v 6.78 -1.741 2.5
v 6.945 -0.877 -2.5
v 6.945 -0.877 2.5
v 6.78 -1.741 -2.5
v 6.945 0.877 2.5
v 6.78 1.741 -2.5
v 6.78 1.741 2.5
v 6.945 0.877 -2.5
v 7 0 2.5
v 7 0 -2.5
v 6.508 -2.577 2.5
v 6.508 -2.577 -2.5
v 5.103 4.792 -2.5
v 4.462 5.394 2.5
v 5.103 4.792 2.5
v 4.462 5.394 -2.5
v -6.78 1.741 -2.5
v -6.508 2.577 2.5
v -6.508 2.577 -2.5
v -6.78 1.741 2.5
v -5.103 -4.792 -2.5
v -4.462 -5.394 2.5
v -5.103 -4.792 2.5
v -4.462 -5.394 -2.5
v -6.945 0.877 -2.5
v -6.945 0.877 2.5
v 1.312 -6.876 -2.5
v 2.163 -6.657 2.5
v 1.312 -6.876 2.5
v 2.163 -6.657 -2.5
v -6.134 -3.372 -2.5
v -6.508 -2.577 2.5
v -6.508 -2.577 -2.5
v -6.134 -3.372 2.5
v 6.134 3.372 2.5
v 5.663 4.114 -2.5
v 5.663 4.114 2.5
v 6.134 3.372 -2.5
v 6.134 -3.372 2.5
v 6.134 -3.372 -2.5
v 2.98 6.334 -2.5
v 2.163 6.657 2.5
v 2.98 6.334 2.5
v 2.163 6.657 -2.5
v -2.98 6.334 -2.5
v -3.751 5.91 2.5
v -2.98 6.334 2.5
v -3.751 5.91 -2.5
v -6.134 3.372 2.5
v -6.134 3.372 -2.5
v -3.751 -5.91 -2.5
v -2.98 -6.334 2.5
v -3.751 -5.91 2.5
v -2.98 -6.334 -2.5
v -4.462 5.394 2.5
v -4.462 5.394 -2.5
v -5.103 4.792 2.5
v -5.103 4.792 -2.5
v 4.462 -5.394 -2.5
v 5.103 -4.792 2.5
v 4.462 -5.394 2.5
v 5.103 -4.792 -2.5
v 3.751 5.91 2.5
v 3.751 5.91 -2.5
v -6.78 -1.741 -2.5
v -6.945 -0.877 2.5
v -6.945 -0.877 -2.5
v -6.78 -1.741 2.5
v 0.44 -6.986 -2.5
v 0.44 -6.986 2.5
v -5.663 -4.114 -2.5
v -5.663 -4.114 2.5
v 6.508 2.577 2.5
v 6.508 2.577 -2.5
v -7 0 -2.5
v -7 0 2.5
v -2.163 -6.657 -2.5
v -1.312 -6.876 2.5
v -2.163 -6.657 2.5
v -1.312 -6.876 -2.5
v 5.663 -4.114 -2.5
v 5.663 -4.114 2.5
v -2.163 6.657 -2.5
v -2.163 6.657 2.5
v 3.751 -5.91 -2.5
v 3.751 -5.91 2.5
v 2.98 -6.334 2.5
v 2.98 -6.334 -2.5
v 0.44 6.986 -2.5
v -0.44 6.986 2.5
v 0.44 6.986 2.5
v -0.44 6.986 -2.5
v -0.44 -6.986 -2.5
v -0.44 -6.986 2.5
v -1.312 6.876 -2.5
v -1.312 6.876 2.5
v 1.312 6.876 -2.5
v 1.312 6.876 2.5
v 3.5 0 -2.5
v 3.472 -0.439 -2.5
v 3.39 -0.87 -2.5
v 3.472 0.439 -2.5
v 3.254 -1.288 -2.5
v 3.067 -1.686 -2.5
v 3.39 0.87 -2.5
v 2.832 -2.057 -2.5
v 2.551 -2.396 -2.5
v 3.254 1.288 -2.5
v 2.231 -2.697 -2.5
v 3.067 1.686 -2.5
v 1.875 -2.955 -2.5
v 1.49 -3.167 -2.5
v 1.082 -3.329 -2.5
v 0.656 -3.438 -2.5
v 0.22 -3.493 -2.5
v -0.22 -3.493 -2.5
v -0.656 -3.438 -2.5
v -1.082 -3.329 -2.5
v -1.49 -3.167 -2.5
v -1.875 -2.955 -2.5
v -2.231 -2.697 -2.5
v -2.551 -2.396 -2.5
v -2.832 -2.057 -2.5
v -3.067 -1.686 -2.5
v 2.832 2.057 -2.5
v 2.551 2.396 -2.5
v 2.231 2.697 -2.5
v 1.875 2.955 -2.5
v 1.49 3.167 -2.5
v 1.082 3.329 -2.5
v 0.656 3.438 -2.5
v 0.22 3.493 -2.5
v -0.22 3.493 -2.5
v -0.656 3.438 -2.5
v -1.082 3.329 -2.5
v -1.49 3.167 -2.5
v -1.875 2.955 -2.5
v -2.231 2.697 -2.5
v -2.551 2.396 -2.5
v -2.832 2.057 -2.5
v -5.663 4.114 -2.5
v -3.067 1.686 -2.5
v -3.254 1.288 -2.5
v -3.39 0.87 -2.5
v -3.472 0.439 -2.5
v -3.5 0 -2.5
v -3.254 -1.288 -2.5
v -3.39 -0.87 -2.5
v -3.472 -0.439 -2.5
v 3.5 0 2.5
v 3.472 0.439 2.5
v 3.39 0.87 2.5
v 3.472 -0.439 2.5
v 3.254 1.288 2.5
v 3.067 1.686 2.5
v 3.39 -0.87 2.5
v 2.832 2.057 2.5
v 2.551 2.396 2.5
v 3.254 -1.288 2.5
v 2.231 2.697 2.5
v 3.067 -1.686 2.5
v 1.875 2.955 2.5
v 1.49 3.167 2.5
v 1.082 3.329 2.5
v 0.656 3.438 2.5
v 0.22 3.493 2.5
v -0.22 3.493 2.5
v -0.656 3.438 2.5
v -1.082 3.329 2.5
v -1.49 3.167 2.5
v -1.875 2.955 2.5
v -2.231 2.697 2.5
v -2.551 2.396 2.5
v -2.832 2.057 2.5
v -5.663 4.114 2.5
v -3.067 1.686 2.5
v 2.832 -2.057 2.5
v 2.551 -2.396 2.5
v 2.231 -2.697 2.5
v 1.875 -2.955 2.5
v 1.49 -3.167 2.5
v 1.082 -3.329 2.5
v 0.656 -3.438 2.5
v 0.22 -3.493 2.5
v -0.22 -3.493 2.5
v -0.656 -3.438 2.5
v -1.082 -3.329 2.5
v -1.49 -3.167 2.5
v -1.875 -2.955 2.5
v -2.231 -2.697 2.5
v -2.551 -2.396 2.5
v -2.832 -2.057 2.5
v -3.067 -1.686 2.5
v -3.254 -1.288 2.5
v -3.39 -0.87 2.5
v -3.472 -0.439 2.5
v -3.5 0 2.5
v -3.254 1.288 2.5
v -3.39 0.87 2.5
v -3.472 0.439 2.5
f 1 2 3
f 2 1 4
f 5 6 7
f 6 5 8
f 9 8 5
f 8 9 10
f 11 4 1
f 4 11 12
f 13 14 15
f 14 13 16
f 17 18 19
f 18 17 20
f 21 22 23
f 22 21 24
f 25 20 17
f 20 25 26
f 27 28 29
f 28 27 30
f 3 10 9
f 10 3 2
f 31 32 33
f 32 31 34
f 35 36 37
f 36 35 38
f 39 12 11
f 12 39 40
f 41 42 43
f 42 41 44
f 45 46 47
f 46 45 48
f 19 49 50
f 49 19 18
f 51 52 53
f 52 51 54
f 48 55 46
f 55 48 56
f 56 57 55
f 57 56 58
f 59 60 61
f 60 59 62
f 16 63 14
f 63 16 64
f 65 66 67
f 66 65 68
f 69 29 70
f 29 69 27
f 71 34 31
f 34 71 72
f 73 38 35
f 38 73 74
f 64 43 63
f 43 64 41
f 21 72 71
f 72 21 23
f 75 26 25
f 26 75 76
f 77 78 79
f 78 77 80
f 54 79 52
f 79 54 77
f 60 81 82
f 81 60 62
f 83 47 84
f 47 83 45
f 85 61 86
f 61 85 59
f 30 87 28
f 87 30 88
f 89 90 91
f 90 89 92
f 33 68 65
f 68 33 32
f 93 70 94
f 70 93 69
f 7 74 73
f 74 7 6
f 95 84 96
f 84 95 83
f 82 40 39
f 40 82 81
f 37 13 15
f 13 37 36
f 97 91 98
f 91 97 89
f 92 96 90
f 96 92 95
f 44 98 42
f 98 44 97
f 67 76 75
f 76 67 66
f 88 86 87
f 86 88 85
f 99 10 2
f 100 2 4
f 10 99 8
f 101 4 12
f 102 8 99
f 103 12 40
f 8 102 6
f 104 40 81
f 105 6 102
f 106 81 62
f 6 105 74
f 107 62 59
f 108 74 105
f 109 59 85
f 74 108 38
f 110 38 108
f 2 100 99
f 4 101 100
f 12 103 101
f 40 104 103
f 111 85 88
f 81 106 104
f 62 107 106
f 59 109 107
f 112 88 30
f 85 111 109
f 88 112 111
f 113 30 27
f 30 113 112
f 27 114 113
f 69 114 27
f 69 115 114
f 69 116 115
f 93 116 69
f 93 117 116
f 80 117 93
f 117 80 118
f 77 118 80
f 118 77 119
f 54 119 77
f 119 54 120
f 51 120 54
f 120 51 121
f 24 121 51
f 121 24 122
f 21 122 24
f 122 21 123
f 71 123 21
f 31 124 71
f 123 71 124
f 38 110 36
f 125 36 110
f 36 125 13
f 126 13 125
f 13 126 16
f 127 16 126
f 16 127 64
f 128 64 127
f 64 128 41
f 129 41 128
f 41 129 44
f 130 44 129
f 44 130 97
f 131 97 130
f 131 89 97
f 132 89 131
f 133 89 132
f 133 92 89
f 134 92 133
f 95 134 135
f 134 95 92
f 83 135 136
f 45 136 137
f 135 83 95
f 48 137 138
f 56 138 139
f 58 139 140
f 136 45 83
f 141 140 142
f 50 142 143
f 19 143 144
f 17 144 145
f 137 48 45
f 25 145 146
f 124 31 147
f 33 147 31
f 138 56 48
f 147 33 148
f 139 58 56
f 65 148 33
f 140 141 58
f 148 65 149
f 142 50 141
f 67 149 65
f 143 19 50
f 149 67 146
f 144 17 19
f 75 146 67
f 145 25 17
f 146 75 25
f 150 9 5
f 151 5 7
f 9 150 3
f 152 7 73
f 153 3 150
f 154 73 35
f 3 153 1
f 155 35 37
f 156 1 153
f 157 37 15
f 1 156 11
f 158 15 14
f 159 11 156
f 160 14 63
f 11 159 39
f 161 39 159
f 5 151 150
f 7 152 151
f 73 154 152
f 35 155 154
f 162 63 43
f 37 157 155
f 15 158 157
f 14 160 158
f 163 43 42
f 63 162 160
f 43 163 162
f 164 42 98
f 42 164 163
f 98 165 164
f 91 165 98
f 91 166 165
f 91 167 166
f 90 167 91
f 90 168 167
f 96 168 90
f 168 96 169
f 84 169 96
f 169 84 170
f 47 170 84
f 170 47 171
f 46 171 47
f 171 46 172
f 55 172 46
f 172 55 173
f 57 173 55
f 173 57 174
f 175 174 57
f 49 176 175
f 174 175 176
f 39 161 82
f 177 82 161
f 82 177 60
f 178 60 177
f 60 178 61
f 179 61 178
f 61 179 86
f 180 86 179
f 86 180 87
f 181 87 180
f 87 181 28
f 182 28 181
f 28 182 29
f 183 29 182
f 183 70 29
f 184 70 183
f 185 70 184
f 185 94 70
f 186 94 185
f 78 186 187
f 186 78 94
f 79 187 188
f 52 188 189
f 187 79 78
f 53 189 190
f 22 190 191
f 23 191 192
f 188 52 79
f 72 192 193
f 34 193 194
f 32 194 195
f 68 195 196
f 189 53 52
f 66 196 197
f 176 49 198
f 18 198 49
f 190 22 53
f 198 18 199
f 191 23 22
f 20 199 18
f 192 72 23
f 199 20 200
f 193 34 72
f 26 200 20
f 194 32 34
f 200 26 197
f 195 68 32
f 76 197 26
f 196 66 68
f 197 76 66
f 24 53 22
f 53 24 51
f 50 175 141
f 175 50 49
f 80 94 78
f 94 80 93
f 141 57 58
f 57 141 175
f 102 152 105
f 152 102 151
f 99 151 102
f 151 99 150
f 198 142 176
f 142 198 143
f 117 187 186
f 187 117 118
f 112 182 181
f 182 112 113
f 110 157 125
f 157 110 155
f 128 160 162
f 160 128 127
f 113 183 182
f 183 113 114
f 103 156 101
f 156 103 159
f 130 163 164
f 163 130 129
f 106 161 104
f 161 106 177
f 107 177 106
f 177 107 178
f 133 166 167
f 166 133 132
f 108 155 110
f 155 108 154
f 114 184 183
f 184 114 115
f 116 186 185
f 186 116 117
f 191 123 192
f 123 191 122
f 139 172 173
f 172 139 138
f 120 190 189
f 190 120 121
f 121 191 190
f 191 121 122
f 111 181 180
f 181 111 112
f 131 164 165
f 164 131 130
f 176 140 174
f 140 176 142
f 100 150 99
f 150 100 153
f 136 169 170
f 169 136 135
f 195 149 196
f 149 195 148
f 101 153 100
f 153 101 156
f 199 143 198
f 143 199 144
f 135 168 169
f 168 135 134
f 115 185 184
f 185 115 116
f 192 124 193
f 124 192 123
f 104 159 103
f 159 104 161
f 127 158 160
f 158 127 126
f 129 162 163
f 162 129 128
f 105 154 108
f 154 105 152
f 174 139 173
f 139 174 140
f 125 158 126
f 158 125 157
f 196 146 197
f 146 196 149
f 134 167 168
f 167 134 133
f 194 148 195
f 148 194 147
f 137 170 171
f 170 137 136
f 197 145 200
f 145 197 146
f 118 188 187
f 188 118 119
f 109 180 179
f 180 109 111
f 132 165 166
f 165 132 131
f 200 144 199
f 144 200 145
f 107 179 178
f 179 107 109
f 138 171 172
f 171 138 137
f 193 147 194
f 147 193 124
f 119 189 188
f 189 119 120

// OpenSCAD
$fn = 50;


difference() {
	union() {
		translate(v = [0, 0, -2.5000000000]) {
			cylinder(h = 5, r = 7.0000000000);
		}
	}
	union() {
		translate(v = [0, 0, -100.0000000000]) {
			cylinder(h = 200, r = 3.5000000000);
		}
	}
}
